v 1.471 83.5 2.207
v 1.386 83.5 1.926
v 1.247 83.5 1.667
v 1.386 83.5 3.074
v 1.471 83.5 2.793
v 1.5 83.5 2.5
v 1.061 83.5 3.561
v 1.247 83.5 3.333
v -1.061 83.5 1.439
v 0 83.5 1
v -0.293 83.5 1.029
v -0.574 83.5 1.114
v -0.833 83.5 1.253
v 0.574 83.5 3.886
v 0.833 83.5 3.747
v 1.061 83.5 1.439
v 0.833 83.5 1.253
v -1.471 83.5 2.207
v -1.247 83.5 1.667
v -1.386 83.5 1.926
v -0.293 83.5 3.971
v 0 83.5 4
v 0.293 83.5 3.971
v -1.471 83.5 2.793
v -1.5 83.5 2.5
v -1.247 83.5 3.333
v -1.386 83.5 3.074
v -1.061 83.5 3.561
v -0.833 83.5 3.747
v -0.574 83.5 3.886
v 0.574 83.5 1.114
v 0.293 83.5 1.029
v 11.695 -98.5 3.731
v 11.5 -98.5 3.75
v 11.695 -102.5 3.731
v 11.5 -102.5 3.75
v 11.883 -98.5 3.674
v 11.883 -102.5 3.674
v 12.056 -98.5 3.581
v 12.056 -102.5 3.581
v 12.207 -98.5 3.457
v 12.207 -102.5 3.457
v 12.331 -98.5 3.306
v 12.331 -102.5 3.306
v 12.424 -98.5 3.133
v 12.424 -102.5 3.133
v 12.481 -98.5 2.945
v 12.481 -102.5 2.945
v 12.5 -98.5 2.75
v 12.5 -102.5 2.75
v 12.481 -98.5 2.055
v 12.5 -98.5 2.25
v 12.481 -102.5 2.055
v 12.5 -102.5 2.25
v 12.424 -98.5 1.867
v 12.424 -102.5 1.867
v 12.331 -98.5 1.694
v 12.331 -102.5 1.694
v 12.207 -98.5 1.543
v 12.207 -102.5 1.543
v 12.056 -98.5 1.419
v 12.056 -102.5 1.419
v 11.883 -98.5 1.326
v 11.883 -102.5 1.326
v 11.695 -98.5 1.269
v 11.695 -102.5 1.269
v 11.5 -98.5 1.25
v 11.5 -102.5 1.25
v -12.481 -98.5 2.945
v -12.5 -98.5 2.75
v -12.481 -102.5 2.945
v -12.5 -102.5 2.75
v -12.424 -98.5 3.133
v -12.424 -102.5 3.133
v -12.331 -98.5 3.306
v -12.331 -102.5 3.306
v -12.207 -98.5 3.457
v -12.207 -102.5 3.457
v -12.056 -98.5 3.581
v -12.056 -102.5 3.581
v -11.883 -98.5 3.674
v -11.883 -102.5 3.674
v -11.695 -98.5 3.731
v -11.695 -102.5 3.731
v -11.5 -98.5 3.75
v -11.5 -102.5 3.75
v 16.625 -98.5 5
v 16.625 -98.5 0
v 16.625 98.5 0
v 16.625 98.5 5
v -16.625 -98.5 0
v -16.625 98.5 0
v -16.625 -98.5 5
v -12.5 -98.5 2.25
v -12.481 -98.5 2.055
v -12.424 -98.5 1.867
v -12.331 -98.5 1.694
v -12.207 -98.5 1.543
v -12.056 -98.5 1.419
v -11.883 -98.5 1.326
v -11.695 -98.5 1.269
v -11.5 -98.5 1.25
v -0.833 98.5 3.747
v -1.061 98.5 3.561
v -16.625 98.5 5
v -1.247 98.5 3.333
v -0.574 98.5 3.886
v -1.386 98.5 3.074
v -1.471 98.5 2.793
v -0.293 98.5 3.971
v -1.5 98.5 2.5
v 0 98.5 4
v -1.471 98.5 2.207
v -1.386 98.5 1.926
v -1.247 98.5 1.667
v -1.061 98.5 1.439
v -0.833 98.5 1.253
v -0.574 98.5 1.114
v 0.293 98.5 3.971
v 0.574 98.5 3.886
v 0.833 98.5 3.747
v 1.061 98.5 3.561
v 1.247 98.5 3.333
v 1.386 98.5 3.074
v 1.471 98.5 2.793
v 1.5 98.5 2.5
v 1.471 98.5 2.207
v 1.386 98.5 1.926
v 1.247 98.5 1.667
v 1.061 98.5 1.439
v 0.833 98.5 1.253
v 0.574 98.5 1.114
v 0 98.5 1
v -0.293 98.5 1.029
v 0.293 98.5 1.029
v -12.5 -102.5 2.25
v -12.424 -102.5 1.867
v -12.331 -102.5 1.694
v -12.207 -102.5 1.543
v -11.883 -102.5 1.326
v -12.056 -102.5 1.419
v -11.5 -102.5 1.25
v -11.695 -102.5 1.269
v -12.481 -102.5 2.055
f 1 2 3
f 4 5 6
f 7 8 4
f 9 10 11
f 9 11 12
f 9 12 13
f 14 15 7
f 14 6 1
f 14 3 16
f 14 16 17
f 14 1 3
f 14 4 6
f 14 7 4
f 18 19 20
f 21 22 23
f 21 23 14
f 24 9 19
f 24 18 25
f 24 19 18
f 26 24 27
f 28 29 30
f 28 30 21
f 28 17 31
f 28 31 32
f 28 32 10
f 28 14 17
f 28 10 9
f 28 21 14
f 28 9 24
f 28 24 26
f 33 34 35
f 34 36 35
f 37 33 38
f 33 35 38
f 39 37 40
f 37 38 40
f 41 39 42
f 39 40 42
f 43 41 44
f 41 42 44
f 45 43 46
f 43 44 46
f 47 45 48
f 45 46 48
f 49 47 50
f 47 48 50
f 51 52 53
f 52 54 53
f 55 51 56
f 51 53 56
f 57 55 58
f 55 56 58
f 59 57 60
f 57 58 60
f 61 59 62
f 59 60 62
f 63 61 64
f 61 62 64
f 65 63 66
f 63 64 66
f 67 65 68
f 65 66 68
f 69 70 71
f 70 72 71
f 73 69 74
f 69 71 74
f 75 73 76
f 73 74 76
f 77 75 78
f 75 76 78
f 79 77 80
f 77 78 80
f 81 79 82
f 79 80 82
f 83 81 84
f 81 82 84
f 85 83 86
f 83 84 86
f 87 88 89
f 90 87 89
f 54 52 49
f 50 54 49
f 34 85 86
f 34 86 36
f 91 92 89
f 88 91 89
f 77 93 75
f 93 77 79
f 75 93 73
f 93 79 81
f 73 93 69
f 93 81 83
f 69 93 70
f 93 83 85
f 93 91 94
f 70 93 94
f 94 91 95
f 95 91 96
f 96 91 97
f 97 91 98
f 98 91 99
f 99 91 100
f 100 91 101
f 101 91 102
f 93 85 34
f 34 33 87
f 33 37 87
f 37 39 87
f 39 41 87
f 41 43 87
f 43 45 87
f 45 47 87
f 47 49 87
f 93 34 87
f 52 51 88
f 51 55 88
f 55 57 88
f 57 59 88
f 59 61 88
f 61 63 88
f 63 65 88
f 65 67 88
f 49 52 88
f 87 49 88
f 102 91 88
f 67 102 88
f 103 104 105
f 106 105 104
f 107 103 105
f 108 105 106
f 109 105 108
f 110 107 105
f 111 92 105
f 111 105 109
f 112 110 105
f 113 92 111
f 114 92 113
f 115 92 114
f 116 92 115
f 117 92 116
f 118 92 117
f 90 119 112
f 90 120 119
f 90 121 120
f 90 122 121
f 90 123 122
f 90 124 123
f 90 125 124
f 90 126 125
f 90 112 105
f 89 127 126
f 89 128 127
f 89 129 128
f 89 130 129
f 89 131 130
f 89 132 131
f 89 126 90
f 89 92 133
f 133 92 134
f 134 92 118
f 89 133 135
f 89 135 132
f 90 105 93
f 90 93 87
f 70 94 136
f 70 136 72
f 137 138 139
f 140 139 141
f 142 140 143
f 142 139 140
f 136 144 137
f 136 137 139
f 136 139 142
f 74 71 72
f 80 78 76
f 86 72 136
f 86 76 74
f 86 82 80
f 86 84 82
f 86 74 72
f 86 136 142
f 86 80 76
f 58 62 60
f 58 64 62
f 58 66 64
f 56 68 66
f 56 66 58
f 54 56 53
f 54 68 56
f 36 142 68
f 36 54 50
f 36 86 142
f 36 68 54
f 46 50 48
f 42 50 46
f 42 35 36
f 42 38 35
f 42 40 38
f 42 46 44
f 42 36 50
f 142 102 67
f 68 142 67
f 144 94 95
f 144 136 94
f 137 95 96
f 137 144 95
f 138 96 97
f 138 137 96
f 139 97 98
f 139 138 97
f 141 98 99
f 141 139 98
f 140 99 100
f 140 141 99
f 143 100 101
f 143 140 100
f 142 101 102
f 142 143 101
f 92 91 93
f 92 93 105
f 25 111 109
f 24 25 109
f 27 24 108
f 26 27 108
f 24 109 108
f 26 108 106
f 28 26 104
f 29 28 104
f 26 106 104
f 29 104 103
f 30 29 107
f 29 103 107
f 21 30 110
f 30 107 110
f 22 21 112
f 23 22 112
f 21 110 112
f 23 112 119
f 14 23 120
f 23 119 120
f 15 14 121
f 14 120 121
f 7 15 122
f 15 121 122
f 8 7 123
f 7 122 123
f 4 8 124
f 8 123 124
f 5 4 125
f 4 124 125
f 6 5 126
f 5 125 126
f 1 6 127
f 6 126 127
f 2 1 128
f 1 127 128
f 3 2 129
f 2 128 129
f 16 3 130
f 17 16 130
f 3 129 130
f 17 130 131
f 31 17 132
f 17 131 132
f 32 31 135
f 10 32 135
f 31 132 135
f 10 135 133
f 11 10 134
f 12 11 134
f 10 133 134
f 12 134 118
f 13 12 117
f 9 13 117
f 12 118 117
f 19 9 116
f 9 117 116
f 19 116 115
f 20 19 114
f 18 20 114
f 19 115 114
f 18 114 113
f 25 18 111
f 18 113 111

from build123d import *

# Parameters (mm, degrees)
CROQUIS1_W              = 33.25
CROQUIS1_H              = 197
SALIENTE_EXTRUIR1_DEPTH = 5
CROQUIS2_R              = 1.5
CORTAR_EXTRUIR1_DEPTH   = 15
CROQUIS3_W              = 25
CROQUIS3_H              = 2.5
SALIENTE_EXTRUIR2_DEPTH = 4
REDONDEO2_R             = 1


with BuildPart() as part:
    # Croquis1 → Saliente-Extruir1 (new body)
    with BuildSketch(Plane.XY):
        Rectangle(CROQUIS1_W, CROQUIS1_H)
    extrude(amount=SALIENTE_EXTRUIR1_DEPTH)

    # Croquis2 → Cortar-Extruir1 (cut)
    with BuildSketch(Plane(origin=(0, 98.5, 0), x_dir=(1, 0, 0), z_dir=(0, 1, 0))):
        with Locations(Location((0, -2.5, 0), (0, 0, 180))):
            Circle(CROQUIS2_R)
    extrude(amount=-CORTAR_EXTRUIR1_DEPTH, mode=Mode.SUBTRACT)

    # Croquis3 → Saliente-Extruir2 (add)
    with BuildSketch(Plane.XZ.offset(98.5)):
        with Locations((0, 2.5)):
            Rectangle(CROQUIS3_W, CROQUIS3_H)
    extrude(amount=SALIENTE_EXTRUIR2_DEPTH)

    # Redondeo2
    redondeo2_edges = [part.edges().sort_by_distance(p)[0] for p in [
        (-12.5, -100.5, 3.75),
        (-12.5, -100.5, 1.25),
        (12.5, -100.5, 1.25),
        (12.5, -100.5, 3.75),
    ]]
    fillet(redondeo2_edges, radius=REDONDEO2_R)


solid = part.part
